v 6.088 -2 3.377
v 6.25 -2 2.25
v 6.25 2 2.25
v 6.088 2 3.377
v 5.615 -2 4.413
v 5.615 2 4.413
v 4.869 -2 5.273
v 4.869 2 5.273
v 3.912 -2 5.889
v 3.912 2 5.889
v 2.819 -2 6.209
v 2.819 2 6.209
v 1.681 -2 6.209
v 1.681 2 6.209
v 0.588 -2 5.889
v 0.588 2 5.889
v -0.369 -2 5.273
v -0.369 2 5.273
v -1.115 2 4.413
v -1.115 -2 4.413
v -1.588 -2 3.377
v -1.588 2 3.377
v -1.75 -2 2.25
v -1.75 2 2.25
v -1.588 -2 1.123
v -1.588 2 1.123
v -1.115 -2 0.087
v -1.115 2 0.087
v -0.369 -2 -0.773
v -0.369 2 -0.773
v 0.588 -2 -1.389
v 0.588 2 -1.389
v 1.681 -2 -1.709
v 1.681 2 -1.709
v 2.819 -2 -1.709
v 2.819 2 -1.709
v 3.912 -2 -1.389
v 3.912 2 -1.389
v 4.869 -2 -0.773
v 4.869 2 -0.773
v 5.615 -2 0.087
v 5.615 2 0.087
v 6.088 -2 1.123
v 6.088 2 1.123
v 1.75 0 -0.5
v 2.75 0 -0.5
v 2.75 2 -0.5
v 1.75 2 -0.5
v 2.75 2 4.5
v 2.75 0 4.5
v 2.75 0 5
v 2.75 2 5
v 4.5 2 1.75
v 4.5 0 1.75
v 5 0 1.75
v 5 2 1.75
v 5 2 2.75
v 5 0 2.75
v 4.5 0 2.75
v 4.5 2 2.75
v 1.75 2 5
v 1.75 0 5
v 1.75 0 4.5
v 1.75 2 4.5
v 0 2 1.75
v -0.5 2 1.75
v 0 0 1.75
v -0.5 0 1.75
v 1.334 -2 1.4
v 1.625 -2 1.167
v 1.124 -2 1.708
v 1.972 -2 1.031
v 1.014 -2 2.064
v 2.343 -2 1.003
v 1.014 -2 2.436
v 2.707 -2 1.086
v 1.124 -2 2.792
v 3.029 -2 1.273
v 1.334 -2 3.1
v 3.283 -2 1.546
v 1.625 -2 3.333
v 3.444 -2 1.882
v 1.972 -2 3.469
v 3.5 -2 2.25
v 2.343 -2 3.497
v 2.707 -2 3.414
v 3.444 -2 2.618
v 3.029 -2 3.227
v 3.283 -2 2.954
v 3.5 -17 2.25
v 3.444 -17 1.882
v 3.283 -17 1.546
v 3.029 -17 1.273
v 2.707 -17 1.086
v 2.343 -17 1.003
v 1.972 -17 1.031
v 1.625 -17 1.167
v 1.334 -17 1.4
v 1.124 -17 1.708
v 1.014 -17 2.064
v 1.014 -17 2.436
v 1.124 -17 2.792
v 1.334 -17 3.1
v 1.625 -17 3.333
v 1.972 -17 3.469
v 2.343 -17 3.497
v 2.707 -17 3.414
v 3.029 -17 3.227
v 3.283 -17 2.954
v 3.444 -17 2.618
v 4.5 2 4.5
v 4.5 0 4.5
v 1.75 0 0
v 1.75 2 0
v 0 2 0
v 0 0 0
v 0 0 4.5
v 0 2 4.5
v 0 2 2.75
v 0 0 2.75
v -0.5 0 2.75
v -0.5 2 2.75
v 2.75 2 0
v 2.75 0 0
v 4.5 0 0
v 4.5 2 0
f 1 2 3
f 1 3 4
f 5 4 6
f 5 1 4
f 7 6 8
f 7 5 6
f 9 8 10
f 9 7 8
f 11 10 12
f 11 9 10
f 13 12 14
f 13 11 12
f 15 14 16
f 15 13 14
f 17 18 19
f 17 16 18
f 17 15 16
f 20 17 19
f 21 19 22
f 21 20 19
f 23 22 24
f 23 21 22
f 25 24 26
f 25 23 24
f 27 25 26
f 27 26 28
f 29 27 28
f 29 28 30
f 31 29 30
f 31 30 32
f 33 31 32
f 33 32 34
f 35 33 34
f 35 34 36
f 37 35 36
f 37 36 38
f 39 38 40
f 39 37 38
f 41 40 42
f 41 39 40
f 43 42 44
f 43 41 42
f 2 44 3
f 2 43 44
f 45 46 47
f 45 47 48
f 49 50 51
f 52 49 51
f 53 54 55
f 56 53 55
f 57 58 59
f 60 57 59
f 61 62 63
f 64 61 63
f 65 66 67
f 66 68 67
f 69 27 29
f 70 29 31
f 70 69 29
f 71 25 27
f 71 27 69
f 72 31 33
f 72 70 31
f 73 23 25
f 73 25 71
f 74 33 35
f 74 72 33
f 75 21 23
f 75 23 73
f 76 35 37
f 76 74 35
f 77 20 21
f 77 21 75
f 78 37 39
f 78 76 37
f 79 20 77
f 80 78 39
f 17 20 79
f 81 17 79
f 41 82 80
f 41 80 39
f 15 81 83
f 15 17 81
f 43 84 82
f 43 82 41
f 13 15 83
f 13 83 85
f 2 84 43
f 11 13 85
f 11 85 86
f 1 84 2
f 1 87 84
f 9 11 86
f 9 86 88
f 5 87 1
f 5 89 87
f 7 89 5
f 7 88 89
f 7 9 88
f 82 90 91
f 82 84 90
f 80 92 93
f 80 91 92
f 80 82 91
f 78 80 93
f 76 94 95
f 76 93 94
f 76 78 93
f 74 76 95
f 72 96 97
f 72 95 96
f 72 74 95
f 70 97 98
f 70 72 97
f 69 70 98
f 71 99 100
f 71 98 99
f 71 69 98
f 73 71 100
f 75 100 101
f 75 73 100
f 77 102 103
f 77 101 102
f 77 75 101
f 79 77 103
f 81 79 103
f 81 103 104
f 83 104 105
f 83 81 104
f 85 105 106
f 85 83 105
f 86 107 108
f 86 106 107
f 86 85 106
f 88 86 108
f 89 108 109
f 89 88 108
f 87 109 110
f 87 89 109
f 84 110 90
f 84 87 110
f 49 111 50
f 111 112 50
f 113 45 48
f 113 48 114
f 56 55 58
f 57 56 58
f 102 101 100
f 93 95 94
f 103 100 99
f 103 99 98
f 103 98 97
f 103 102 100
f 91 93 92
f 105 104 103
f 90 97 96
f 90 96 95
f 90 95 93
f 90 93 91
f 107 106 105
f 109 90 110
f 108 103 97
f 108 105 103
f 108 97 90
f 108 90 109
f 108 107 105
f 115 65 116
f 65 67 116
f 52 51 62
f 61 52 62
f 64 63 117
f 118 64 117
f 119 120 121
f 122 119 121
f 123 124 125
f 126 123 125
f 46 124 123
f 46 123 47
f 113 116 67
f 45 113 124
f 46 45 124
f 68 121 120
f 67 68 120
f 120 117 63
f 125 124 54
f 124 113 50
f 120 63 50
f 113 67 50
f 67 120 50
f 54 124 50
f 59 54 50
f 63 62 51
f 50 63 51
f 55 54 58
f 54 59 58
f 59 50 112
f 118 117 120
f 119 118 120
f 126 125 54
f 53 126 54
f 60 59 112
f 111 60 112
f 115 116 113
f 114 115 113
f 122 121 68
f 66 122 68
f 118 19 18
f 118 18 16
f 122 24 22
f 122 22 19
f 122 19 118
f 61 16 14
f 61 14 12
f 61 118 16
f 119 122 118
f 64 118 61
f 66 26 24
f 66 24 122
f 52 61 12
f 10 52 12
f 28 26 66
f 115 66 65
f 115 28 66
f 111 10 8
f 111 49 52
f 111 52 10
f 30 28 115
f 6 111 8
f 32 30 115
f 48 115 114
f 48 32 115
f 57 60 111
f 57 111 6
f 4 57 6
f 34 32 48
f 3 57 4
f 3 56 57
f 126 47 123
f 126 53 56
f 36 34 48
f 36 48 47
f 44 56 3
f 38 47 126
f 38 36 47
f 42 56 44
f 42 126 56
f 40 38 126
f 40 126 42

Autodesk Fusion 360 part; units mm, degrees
sketch "Sketch1" plane through (0, 0, 0) normal (0, 1, 0) x (1, 0, 0)
  line L0 (0, 0) -> (4.5, 0)
  line L1 (4.5, 0) -> (4.5, -4.5)
  line L2 (4.5, -4.5) -> (0, -4.5)
  line L3 (0, -4.5) -> (0, 0)
  line L4 (0, -4.5) -> (4.5, 0) construction
  line L5 (4.5, -4.5) -> (0, 0) construction
  circle A0 centre (2.25, -2.25) radius 4
  line L6 (4.5, -2.25) -> (4.5, -1.75)
  line L7 (4.5, -1.75) -> (5, -1.75)
  line L8 (5, -1.75) -> (5, -2.75)
  line L9 (5, -2.75) -> (4.5, -2.75)
  line L10 (0, -2.75) -> (-0.5, -2.75)
  line L11 (-0.5, -2.75) -> (-0.5, -1.75)
  line L12 (-0.5, -1.75) -> (0, -1.75)
  line L13 (2.25, -2.25) -> (2.25, -4.5) construction
  line L14 (2.25, -2.25) -> (2.25, 0) construction
  line L15 (2.25, -4.5) -> (2.75, -4.5) construction
  line L16 (2.75, -4.5) -> (2.75, -5)
  line L17 (2.75, -5) -> (1.75, -5)
  line L18 (1.75, -5) -> (1.75, -4.5)
  line L19 (2.25, 0) -> (2.75, 0) construction
  line L20 (2.75, 0) -> (2.75, 0.5)
  line L21 (2.75, 0.5) -> (1.75, 0.5)
  line L22 (1.75, 0.5) -> (1.75, 0)
  dimension "d1" = 4.5
  dimension "d2" = 4.5
  dimension "d3" = 4.5
  dimension "d4" = 8
  dimension "d5" = 0.5
  dimension "d6" = 1
  dimension "d7" = 0.5
  dimension "d8" = 1
  dimension "d9" = 0.5
  dimension "d10" = 0.5
  dimension "d11" = 1
  dimension "d12" = 0.5
  dimension "d13" = 0.5
  dimension "d14" = 1
extrude "Extrude1" add sketch "Sketch1" along normal blind 2
sketch "Sketch2" plane through (0, 0, 0) normal (0, -1, 0) x (1, 0, 0)
  line L0 (2.75, 0) -> (2.75, -0.5)
  line L1 (2.75, -0.5) -> (1.75, -0.5)
  line L2 (1.75, -0.5) -> (1.75, 0)
  line L3 (1.75, 0) -> (0, 0)
  line L4 (0, 0) -> (0, 1.75)
  line L5 (0, 1.75) -> (-0.5, 1.75)
  line L6 (-0.5, 1.75) -> (-0.5, 2.75)
  line L7 (-0.5, 2.75) -> (0, 2.75)
  line L8 (0, 2.75) -> (0, 4.5)
  line L9 (0, 4.5) -> (1.75, 4.5)
  line L10 (1.75, 4.5) -> (1.75, 5)
  line L11 (1.75, 5) -> (2.75, 5)
  line L12 (2.75, 5) -> (2.75, 4.5)
  line L13 (2.75, 4.5) -> (4.5, 4.5)
  line L14 (4.5, 4.5) -> (4.5, 2.75)
  line L15 (4.5, 2.75) -> (5, 2.75)
  line L16 (5, 2.75) -> (5, 1.75)
  line L17 (5, 1.75) -> (4.5, 1.75)
  line L18 (4.5, 1.75) -> (4.5, 0)
  line L19 (4.5, 0) -> (2.75, 0)
  circle A0 centre (2.25, 2.25) radius 4
extrude "Extrude2" add sketch "Sketch2" along normal blind 2 contours L0 L1 L2 L3 L4 L5 L6 L7 L8 L9 L10 L11 L12 L13 L14 L15 L16 L17 L18 L19 | A0
sketch "Sketch3" plane through (0, -2, 0) normal (0, -1, 0) x (1, 0, 0)
  circle A0 centre (2.25, 2.25) radius 4
sketch "Sketch4" plane through (0, -2, 0) normal (0, -1, 0) x (1, 0, 0)
  circle A0 centre (2.25, 2.25) radius 1.25
  point P0 (2.25, 2.25)
  dimension "d19" = 2.5
  dimension "d21" = 0
extrude "Extrude3" add sketch "Sketch4" along normal blind 15
